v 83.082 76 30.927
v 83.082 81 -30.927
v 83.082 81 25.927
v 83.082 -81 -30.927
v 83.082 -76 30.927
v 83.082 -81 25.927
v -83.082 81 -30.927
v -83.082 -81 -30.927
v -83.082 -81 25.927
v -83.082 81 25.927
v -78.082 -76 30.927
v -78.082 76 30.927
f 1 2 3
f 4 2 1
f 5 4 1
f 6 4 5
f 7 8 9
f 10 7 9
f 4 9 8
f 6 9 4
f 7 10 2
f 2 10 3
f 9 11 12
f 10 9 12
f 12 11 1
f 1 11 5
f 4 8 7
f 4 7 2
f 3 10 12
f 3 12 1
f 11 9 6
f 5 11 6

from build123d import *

# Parameters (mm, degrees)
F0_W     = 166.16489
F0_H     = 61.853946
F1_DEPTH = 81
F2_SIZE  = 5


with BuildPart() as f1:
    # F0 (on Front) → F1 (new body)
    with BuildSketch(Plane.XZ):
        Rectangle(F0_W, F0_H)
    extrude(amount=F1_DEPTH)

    # F2
    f2_edges = [f1.edges().sort_by_distance(p)[0] for p in [
        (0, -81, 30.926973),
        (-83.082445, -40.5, 30.926973),
    ]]
    chamfer(f2_edges, length=F2_SIZE)

    # F3: F1 across face


with BuildPart() as f1_1:
    add(f1.part)
    add(f1.part.mirror(Plane(origin=(0.099138, 0, -0.03563), x_dir=(1, 0, 0), z_dir=(0, 1, 0))))


solid = f1_1.part
